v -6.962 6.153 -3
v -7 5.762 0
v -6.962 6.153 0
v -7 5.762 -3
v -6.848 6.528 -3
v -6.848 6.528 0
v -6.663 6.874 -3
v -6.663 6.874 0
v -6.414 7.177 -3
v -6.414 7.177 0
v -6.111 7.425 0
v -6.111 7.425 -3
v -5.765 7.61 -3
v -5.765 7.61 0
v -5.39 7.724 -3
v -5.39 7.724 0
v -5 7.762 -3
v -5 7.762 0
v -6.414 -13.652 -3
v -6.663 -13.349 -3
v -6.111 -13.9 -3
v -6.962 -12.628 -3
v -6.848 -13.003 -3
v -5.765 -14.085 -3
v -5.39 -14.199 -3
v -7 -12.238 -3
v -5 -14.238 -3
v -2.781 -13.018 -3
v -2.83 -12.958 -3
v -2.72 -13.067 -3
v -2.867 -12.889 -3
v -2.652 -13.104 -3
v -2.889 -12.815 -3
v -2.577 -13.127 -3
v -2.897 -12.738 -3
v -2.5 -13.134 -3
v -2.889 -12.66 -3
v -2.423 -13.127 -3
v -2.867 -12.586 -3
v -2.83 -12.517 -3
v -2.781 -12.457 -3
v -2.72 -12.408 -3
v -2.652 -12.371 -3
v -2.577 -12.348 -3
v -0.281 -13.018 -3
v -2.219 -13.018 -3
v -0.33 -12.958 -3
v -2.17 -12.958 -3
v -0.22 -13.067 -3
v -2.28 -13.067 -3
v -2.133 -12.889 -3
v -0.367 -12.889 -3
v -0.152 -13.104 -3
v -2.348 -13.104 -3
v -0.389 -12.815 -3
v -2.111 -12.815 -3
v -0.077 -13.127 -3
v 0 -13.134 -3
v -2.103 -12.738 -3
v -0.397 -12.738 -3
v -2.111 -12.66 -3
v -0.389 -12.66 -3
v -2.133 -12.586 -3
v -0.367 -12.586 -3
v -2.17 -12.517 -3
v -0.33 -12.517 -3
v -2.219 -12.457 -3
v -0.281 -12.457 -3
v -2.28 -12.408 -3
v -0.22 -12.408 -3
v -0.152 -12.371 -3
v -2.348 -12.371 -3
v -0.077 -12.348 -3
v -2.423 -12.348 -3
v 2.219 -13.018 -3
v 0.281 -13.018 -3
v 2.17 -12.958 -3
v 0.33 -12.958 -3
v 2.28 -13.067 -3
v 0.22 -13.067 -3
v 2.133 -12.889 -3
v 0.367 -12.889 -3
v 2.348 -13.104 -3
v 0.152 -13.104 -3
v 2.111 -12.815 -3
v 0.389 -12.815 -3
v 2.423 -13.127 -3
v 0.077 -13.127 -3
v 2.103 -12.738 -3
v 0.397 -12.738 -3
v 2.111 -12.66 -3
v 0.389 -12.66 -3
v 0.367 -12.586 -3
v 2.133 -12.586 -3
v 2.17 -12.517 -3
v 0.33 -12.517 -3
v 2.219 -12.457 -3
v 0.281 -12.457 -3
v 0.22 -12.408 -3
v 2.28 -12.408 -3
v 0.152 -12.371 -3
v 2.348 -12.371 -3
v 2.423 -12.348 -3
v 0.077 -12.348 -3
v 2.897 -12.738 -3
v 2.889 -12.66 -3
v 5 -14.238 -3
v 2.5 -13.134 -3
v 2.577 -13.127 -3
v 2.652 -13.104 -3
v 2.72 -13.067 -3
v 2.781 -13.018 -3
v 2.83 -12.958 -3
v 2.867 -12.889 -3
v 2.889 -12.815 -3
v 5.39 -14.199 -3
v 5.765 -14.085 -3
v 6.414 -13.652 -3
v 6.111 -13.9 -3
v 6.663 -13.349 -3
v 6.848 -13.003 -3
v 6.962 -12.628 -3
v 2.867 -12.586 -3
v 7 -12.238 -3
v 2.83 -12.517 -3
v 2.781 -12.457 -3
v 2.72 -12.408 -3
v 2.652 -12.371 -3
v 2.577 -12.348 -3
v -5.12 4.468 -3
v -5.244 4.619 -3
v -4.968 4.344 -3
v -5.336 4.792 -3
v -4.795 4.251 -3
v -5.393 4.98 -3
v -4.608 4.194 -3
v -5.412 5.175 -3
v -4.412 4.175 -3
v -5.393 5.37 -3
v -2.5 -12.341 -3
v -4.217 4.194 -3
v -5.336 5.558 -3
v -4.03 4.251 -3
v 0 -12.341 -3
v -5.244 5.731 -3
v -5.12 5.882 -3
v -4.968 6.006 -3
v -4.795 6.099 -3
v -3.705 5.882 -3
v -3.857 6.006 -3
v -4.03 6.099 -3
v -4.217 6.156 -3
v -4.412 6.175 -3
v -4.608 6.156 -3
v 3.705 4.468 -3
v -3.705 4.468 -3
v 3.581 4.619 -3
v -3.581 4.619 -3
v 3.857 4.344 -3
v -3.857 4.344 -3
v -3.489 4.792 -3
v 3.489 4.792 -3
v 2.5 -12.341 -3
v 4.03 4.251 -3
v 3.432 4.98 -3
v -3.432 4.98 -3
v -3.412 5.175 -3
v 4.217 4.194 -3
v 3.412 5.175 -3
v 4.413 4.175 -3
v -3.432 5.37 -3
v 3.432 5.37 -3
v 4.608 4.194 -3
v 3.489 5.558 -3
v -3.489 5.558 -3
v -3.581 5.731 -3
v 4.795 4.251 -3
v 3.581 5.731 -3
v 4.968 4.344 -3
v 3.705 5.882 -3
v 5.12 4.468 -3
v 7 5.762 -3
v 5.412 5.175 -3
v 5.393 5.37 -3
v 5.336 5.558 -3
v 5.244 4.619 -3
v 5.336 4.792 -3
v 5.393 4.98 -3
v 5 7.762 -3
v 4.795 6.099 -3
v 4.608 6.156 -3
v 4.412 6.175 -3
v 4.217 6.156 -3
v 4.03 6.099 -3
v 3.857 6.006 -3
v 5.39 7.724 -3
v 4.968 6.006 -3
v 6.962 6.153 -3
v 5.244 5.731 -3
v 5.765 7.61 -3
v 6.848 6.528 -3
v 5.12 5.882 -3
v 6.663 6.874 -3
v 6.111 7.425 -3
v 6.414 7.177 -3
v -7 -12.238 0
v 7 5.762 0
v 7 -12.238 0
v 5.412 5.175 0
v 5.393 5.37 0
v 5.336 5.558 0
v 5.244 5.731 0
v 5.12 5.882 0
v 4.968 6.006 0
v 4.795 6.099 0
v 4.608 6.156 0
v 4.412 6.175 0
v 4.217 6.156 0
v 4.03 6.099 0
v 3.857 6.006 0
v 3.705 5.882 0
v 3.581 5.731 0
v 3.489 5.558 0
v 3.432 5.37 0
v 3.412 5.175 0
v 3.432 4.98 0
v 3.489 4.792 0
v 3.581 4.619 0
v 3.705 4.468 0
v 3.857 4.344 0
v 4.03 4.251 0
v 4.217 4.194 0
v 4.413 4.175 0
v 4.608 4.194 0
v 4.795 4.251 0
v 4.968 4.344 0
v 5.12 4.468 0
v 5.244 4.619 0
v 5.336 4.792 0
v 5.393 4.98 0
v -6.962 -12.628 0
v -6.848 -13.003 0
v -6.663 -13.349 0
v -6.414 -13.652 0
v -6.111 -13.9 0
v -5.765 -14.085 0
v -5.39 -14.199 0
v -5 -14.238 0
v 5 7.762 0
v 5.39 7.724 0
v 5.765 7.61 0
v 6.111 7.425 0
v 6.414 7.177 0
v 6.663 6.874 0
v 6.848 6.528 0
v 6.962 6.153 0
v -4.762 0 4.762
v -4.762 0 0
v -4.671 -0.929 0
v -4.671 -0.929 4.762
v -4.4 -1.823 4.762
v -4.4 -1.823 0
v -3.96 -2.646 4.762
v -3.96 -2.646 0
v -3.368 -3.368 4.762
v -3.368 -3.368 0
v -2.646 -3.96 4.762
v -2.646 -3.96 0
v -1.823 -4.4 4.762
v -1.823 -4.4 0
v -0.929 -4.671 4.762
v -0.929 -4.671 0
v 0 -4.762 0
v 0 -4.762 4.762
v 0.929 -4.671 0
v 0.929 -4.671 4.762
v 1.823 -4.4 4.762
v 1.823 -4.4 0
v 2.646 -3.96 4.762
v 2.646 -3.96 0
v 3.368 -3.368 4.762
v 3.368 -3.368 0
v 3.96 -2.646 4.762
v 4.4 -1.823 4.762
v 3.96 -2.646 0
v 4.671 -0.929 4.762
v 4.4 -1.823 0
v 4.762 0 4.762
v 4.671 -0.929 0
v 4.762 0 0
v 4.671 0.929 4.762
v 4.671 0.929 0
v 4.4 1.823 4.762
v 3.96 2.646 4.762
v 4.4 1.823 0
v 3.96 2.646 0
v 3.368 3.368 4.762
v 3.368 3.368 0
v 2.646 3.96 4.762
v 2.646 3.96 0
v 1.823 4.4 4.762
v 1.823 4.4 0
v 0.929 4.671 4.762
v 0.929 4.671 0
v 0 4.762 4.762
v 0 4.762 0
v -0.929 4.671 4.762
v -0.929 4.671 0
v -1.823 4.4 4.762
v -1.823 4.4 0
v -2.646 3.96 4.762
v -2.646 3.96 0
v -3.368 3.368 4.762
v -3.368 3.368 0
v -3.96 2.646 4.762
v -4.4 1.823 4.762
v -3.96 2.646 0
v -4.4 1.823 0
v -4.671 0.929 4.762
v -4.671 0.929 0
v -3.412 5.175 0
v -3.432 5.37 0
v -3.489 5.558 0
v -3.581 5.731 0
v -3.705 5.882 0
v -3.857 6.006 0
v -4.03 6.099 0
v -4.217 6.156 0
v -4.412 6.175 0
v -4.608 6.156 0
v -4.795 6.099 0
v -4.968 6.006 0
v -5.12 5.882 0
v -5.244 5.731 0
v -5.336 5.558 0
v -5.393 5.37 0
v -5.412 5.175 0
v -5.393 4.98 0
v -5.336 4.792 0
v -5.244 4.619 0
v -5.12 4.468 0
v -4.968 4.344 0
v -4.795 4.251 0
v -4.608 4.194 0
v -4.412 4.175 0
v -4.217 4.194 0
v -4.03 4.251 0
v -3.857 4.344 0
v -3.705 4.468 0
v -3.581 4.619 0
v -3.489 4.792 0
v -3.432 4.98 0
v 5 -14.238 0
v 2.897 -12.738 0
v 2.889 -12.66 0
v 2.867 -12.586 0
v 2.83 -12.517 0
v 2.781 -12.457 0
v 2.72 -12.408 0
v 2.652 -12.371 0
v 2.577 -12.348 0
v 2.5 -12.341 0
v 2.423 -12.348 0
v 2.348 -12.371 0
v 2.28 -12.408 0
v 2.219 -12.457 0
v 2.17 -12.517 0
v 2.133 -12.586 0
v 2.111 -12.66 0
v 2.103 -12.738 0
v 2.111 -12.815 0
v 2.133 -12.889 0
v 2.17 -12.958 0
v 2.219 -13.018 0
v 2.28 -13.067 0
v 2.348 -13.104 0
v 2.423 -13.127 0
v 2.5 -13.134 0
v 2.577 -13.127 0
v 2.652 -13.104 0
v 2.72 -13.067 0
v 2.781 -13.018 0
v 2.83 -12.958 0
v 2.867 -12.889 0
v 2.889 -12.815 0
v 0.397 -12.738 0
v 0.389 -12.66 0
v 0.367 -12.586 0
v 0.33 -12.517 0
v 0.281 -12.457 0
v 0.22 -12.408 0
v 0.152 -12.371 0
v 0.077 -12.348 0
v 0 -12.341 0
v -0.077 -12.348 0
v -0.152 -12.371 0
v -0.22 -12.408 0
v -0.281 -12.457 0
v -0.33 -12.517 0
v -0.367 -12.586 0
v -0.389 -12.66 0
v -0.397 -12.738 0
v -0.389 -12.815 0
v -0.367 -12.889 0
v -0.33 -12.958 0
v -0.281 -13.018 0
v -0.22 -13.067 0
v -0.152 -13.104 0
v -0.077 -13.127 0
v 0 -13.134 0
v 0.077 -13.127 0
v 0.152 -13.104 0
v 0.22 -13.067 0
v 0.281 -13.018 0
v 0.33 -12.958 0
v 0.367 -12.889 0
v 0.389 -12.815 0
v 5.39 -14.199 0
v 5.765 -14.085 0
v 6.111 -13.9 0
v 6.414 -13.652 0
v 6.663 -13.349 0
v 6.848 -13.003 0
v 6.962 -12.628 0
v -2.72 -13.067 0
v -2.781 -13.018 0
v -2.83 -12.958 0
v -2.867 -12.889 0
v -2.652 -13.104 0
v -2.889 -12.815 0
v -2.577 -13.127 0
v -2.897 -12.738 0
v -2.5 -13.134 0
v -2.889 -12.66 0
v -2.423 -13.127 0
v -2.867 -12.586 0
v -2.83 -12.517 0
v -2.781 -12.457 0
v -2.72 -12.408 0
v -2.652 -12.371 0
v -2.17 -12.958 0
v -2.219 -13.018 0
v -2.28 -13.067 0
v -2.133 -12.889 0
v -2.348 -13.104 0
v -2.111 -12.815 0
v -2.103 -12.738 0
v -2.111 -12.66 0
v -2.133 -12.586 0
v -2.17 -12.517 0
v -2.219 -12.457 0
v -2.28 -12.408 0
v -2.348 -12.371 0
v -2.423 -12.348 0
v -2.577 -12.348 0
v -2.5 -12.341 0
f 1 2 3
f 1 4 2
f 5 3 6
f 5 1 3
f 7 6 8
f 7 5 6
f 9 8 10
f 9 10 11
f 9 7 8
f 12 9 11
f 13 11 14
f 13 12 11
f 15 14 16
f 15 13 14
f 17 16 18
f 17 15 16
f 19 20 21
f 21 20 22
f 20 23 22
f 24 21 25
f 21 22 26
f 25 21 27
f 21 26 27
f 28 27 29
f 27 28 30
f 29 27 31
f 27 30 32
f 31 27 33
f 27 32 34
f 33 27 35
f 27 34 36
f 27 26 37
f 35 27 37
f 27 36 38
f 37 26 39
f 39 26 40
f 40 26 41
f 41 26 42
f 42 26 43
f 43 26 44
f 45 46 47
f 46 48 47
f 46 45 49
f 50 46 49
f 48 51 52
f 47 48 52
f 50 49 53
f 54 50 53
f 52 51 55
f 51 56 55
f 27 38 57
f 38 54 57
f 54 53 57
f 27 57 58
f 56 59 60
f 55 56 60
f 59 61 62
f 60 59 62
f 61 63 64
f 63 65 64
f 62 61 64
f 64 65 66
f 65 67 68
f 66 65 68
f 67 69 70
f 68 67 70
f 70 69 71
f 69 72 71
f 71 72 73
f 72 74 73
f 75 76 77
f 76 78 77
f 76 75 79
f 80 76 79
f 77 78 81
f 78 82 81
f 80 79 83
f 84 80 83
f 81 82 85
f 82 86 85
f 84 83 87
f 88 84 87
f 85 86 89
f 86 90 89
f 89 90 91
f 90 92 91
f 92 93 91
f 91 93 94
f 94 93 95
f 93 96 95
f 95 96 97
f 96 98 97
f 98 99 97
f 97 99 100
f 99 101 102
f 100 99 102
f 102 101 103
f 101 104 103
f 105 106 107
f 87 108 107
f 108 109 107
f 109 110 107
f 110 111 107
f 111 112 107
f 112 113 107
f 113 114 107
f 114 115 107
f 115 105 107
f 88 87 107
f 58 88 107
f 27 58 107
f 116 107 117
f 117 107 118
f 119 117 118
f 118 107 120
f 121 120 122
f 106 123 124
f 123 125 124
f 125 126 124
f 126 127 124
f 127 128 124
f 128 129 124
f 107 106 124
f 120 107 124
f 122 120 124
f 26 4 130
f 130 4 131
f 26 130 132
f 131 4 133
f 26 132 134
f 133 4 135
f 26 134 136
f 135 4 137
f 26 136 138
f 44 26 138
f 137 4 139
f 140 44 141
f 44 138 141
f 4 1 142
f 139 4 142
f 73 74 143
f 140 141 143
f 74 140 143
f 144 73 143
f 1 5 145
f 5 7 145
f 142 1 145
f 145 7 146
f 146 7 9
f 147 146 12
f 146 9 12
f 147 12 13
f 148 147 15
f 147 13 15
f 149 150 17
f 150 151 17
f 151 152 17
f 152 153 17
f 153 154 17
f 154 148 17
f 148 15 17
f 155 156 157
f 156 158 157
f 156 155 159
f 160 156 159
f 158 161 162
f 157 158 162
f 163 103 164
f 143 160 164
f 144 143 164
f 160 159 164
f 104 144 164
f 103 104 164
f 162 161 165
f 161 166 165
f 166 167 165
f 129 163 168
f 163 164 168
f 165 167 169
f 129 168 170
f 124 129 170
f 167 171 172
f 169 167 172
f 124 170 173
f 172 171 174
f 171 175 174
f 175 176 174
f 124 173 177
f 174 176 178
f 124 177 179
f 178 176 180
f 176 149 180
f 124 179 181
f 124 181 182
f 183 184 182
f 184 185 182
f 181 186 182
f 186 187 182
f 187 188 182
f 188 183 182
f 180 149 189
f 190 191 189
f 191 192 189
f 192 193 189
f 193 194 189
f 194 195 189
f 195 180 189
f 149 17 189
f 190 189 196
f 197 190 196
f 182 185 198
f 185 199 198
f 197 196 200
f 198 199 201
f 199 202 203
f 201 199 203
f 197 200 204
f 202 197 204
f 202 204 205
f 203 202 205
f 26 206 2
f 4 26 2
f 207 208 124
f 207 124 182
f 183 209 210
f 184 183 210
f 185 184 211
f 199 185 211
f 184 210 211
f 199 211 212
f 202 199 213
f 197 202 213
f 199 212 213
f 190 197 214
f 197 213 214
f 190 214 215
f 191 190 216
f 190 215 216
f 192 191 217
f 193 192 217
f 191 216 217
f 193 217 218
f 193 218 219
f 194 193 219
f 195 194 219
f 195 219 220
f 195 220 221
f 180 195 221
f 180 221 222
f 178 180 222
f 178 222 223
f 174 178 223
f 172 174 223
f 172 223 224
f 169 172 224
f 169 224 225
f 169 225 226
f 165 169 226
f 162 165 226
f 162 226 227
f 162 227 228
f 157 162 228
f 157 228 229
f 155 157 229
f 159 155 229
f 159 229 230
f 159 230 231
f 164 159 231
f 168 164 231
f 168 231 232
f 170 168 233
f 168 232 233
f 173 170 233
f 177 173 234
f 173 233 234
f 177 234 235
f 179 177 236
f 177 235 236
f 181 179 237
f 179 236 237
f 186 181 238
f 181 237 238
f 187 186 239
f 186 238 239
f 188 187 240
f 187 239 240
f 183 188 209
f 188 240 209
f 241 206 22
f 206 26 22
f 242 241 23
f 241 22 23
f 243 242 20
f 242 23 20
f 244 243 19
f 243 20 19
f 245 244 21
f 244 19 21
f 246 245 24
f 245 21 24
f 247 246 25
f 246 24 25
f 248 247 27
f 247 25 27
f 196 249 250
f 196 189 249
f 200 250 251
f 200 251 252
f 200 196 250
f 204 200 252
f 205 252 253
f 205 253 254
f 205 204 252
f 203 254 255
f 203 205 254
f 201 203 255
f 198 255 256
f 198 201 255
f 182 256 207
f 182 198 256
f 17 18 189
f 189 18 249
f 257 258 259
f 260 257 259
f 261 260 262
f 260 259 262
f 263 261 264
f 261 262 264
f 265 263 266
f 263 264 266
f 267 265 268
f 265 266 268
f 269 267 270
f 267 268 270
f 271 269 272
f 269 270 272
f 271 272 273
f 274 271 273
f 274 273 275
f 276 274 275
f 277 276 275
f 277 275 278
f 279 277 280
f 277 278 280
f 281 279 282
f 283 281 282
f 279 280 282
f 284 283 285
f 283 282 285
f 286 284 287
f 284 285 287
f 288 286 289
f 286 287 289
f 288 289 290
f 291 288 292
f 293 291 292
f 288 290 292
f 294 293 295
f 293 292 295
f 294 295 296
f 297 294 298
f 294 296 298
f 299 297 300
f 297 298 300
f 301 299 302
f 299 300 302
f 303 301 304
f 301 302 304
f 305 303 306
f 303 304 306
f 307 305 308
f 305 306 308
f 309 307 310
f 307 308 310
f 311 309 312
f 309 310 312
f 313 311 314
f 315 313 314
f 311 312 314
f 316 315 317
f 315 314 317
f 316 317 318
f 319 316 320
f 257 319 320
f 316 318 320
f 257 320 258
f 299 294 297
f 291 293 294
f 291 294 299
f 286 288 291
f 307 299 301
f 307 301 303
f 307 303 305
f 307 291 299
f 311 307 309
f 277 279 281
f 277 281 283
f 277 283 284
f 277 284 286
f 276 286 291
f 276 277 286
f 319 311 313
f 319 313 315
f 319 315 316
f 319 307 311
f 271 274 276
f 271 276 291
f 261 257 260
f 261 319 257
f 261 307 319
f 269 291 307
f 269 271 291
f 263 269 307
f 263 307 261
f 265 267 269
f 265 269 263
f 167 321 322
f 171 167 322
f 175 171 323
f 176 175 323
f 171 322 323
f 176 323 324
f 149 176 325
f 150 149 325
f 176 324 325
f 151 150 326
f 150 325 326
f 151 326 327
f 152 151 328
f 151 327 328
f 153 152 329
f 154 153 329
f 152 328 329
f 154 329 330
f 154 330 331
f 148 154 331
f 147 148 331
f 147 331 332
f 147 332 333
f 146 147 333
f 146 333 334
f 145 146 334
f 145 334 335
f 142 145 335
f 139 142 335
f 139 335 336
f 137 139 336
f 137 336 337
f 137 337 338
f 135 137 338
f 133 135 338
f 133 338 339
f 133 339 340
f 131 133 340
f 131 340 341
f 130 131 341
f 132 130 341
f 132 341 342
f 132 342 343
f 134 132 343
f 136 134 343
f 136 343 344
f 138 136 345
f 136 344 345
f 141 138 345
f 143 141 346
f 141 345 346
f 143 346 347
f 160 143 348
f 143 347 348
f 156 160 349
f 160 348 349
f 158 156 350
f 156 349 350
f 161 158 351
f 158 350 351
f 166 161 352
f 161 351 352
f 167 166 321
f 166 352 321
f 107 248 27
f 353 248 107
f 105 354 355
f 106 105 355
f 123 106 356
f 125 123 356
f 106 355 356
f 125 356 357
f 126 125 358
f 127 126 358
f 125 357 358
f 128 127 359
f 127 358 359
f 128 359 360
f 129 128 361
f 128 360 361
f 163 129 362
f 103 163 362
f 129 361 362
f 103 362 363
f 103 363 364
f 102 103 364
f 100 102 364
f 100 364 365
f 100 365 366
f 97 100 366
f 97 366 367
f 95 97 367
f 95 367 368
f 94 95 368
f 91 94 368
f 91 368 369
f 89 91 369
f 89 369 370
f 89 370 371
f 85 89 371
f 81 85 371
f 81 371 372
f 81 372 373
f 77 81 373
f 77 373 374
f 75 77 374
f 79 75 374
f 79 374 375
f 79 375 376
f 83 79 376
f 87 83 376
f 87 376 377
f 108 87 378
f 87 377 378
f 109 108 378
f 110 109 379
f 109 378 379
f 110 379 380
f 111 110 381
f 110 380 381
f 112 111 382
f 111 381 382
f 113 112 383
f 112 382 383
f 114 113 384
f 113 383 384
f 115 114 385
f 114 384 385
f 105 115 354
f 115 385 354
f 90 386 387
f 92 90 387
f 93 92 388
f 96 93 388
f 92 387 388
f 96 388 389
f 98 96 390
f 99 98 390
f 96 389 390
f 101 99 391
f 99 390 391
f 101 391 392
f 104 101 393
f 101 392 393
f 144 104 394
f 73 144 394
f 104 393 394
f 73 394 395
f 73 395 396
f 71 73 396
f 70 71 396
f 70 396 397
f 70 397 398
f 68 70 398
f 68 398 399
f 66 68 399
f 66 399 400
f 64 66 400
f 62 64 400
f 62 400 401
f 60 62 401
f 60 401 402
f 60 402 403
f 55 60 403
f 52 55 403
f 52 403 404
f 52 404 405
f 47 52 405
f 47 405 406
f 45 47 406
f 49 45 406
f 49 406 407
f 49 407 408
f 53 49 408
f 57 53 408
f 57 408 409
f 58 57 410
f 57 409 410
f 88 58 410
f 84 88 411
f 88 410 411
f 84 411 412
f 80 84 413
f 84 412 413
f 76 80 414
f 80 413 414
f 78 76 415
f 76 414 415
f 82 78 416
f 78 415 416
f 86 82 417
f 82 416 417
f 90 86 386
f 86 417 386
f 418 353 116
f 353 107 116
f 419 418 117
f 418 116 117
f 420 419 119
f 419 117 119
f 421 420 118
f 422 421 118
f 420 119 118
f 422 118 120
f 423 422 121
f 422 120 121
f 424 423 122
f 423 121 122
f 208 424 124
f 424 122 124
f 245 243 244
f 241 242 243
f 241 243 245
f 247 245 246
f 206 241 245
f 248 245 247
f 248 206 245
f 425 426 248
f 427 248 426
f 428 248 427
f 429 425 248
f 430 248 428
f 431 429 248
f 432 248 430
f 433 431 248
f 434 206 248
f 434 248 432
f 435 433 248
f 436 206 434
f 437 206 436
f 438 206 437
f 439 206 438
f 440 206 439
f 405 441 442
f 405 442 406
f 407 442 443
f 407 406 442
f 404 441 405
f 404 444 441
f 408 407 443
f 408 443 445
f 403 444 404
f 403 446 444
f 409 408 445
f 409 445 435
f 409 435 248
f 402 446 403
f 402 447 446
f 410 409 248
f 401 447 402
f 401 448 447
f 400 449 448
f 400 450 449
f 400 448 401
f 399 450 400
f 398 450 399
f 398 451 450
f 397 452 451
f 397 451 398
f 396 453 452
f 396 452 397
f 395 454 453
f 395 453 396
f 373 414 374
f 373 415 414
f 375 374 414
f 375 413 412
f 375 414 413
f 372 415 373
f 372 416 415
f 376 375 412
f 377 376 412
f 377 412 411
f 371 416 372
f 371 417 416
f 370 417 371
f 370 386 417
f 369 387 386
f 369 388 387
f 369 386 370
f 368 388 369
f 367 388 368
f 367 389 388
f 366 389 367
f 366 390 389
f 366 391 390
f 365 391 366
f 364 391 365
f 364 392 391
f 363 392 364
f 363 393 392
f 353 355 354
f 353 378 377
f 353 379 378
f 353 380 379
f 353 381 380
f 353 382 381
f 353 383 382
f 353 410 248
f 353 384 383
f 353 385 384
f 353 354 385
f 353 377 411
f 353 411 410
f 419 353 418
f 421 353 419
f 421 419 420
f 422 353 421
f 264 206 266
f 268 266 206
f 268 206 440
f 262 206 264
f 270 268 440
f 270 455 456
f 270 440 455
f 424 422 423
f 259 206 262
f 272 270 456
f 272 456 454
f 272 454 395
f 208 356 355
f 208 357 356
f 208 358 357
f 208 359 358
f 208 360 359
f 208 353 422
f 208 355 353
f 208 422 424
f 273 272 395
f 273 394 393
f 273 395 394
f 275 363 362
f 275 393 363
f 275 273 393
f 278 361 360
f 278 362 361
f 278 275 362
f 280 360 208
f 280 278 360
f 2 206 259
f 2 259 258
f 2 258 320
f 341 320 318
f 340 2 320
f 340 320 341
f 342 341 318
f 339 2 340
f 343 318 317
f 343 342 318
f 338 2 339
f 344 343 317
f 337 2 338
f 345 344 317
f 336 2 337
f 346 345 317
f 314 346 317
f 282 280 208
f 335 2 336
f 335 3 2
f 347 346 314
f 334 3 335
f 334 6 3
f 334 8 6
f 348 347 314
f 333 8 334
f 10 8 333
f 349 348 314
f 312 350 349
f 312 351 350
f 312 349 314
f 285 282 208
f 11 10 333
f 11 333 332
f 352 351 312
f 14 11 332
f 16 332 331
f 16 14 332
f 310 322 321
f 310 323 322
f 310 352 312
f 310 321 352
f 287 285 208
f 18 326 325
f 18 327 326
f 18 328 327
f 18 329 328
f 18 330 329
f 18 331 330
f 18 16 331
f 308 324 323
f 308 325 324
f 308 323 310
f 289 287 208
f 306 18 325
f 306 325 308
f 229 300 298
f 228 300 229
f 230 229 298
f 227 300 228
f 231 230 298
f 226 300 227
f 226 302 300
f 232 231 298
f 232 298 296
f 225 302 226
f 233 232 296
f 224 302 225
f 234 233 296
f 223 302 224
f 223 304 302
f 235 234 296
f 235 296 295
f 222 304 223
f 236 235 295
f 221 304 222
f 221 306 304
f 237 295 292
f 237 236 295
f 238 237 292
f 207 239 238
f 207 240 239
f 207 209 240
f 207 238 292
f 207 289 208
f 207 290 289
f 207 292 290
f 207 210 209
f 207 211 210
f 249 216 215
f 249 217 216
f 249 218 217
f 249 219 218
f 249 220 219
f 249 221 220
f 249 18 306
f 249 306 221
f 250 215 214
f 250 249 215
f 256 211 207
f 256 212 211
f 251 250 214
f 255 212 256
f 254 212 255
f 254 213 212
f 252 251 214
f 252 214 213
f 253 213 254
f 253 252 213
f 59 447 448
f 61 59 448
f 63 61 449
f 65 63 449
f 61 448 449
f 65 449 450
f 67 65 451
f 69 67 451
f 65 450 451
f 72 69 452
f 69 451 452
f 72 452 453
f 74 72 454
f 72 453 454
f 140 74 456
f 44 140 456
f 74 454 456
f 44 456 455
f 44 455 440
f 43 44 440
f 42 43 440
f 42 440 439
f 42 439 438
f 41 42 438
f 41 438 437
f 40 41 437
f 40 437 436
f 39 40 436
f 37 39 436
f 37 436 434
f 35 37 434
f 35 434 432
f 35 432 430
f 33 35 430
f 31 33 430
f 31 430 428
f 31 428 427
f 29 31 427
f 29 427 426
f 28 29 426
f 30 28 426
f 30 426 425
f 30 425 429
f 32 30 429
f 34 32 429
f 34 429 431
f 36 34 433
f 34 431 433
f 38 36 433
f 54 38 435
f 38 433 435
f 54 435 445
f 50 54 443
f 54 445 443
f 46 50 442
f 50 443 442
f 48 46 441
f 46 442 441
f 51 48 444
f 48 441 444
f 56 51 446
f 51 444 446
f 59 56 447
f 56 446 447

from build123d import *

# Parameters (mm, degrees)
SKETCH1_R               = 4.7625
BOSS_EXTRUDE1_DEPTH     = 4.7625
SKETCH1_3_W             = 14
SKETCH1_3_H             = 22
BOSS_EXTRUDE2_DEPTH     = 3
FILLET1_R               = 2
CUT_EXTRUDE1_DEPTH      = 17.56465552
CUT_EXTRUDE1_DEPTH_BACK = 17.56465552
SKETCH2_R               = 0.396875
SKETCH2_R_2             = 1


with BuildPart() as part:
    # Sketch1 → Boss-Extrude1 (new body)
    with BuildSketch(Plane.XY):
        Circle(SKETCH1_R)
    extrude(amount=BOSS_EXTRUDE1_DEPTH)

    # Sketch1<3> → Boss-Extrude2 (add)
    with BuildSketch(Plane.XY):
        with Locations((0, -3.2375)):
            Rectangle(SKETCH1_3_W, SKETCH1_3_H)
    extrude(amount=-BOSS_EXTRUDE2_DEPTH)

    # Fillet1
    fillet1_edges = [part.edges().sort_by_distance(p)[0] for p in [
        (-7, -14.2375, -1.5),
        (-7, 7.7625, -1.5),
        (7, -14.2375, -1.5),
        (7, 7.7625, -1.5),
    ]]
    fillet(fillet1_edges, radius=FILLET1_R)

    # Sketch2 → Cut-Extrude1 (cut, two sides: drawn at the far end of the back side and taken through both)
    with BuildSketch(Plane.XY.offset(-CUT_EXTRUDE1_DEPTH_BACK)):
        with Locations((0, -12.7375)):
            Circle(SKETCH2_R)
        with Locations((2.5, -12.7375)):
            Circle(SKETCH2_R)
        with Locations((-2.5, -12.7375)):
            Circle(SKETCH2_R)
        with Locations((-4.4125, 5.175)):
            Circle(SKETCH2_R_2)
        with Locations((4.4125, 5.175)):
            Circle(SKETCH2_R_2)
    extrude(amount=CUT_EXTRUDE1_DEPTH + CUT_EXTRUDE1_DEPTH_BACK, mode=Mode.SUBTRACT)


solid = part.part
